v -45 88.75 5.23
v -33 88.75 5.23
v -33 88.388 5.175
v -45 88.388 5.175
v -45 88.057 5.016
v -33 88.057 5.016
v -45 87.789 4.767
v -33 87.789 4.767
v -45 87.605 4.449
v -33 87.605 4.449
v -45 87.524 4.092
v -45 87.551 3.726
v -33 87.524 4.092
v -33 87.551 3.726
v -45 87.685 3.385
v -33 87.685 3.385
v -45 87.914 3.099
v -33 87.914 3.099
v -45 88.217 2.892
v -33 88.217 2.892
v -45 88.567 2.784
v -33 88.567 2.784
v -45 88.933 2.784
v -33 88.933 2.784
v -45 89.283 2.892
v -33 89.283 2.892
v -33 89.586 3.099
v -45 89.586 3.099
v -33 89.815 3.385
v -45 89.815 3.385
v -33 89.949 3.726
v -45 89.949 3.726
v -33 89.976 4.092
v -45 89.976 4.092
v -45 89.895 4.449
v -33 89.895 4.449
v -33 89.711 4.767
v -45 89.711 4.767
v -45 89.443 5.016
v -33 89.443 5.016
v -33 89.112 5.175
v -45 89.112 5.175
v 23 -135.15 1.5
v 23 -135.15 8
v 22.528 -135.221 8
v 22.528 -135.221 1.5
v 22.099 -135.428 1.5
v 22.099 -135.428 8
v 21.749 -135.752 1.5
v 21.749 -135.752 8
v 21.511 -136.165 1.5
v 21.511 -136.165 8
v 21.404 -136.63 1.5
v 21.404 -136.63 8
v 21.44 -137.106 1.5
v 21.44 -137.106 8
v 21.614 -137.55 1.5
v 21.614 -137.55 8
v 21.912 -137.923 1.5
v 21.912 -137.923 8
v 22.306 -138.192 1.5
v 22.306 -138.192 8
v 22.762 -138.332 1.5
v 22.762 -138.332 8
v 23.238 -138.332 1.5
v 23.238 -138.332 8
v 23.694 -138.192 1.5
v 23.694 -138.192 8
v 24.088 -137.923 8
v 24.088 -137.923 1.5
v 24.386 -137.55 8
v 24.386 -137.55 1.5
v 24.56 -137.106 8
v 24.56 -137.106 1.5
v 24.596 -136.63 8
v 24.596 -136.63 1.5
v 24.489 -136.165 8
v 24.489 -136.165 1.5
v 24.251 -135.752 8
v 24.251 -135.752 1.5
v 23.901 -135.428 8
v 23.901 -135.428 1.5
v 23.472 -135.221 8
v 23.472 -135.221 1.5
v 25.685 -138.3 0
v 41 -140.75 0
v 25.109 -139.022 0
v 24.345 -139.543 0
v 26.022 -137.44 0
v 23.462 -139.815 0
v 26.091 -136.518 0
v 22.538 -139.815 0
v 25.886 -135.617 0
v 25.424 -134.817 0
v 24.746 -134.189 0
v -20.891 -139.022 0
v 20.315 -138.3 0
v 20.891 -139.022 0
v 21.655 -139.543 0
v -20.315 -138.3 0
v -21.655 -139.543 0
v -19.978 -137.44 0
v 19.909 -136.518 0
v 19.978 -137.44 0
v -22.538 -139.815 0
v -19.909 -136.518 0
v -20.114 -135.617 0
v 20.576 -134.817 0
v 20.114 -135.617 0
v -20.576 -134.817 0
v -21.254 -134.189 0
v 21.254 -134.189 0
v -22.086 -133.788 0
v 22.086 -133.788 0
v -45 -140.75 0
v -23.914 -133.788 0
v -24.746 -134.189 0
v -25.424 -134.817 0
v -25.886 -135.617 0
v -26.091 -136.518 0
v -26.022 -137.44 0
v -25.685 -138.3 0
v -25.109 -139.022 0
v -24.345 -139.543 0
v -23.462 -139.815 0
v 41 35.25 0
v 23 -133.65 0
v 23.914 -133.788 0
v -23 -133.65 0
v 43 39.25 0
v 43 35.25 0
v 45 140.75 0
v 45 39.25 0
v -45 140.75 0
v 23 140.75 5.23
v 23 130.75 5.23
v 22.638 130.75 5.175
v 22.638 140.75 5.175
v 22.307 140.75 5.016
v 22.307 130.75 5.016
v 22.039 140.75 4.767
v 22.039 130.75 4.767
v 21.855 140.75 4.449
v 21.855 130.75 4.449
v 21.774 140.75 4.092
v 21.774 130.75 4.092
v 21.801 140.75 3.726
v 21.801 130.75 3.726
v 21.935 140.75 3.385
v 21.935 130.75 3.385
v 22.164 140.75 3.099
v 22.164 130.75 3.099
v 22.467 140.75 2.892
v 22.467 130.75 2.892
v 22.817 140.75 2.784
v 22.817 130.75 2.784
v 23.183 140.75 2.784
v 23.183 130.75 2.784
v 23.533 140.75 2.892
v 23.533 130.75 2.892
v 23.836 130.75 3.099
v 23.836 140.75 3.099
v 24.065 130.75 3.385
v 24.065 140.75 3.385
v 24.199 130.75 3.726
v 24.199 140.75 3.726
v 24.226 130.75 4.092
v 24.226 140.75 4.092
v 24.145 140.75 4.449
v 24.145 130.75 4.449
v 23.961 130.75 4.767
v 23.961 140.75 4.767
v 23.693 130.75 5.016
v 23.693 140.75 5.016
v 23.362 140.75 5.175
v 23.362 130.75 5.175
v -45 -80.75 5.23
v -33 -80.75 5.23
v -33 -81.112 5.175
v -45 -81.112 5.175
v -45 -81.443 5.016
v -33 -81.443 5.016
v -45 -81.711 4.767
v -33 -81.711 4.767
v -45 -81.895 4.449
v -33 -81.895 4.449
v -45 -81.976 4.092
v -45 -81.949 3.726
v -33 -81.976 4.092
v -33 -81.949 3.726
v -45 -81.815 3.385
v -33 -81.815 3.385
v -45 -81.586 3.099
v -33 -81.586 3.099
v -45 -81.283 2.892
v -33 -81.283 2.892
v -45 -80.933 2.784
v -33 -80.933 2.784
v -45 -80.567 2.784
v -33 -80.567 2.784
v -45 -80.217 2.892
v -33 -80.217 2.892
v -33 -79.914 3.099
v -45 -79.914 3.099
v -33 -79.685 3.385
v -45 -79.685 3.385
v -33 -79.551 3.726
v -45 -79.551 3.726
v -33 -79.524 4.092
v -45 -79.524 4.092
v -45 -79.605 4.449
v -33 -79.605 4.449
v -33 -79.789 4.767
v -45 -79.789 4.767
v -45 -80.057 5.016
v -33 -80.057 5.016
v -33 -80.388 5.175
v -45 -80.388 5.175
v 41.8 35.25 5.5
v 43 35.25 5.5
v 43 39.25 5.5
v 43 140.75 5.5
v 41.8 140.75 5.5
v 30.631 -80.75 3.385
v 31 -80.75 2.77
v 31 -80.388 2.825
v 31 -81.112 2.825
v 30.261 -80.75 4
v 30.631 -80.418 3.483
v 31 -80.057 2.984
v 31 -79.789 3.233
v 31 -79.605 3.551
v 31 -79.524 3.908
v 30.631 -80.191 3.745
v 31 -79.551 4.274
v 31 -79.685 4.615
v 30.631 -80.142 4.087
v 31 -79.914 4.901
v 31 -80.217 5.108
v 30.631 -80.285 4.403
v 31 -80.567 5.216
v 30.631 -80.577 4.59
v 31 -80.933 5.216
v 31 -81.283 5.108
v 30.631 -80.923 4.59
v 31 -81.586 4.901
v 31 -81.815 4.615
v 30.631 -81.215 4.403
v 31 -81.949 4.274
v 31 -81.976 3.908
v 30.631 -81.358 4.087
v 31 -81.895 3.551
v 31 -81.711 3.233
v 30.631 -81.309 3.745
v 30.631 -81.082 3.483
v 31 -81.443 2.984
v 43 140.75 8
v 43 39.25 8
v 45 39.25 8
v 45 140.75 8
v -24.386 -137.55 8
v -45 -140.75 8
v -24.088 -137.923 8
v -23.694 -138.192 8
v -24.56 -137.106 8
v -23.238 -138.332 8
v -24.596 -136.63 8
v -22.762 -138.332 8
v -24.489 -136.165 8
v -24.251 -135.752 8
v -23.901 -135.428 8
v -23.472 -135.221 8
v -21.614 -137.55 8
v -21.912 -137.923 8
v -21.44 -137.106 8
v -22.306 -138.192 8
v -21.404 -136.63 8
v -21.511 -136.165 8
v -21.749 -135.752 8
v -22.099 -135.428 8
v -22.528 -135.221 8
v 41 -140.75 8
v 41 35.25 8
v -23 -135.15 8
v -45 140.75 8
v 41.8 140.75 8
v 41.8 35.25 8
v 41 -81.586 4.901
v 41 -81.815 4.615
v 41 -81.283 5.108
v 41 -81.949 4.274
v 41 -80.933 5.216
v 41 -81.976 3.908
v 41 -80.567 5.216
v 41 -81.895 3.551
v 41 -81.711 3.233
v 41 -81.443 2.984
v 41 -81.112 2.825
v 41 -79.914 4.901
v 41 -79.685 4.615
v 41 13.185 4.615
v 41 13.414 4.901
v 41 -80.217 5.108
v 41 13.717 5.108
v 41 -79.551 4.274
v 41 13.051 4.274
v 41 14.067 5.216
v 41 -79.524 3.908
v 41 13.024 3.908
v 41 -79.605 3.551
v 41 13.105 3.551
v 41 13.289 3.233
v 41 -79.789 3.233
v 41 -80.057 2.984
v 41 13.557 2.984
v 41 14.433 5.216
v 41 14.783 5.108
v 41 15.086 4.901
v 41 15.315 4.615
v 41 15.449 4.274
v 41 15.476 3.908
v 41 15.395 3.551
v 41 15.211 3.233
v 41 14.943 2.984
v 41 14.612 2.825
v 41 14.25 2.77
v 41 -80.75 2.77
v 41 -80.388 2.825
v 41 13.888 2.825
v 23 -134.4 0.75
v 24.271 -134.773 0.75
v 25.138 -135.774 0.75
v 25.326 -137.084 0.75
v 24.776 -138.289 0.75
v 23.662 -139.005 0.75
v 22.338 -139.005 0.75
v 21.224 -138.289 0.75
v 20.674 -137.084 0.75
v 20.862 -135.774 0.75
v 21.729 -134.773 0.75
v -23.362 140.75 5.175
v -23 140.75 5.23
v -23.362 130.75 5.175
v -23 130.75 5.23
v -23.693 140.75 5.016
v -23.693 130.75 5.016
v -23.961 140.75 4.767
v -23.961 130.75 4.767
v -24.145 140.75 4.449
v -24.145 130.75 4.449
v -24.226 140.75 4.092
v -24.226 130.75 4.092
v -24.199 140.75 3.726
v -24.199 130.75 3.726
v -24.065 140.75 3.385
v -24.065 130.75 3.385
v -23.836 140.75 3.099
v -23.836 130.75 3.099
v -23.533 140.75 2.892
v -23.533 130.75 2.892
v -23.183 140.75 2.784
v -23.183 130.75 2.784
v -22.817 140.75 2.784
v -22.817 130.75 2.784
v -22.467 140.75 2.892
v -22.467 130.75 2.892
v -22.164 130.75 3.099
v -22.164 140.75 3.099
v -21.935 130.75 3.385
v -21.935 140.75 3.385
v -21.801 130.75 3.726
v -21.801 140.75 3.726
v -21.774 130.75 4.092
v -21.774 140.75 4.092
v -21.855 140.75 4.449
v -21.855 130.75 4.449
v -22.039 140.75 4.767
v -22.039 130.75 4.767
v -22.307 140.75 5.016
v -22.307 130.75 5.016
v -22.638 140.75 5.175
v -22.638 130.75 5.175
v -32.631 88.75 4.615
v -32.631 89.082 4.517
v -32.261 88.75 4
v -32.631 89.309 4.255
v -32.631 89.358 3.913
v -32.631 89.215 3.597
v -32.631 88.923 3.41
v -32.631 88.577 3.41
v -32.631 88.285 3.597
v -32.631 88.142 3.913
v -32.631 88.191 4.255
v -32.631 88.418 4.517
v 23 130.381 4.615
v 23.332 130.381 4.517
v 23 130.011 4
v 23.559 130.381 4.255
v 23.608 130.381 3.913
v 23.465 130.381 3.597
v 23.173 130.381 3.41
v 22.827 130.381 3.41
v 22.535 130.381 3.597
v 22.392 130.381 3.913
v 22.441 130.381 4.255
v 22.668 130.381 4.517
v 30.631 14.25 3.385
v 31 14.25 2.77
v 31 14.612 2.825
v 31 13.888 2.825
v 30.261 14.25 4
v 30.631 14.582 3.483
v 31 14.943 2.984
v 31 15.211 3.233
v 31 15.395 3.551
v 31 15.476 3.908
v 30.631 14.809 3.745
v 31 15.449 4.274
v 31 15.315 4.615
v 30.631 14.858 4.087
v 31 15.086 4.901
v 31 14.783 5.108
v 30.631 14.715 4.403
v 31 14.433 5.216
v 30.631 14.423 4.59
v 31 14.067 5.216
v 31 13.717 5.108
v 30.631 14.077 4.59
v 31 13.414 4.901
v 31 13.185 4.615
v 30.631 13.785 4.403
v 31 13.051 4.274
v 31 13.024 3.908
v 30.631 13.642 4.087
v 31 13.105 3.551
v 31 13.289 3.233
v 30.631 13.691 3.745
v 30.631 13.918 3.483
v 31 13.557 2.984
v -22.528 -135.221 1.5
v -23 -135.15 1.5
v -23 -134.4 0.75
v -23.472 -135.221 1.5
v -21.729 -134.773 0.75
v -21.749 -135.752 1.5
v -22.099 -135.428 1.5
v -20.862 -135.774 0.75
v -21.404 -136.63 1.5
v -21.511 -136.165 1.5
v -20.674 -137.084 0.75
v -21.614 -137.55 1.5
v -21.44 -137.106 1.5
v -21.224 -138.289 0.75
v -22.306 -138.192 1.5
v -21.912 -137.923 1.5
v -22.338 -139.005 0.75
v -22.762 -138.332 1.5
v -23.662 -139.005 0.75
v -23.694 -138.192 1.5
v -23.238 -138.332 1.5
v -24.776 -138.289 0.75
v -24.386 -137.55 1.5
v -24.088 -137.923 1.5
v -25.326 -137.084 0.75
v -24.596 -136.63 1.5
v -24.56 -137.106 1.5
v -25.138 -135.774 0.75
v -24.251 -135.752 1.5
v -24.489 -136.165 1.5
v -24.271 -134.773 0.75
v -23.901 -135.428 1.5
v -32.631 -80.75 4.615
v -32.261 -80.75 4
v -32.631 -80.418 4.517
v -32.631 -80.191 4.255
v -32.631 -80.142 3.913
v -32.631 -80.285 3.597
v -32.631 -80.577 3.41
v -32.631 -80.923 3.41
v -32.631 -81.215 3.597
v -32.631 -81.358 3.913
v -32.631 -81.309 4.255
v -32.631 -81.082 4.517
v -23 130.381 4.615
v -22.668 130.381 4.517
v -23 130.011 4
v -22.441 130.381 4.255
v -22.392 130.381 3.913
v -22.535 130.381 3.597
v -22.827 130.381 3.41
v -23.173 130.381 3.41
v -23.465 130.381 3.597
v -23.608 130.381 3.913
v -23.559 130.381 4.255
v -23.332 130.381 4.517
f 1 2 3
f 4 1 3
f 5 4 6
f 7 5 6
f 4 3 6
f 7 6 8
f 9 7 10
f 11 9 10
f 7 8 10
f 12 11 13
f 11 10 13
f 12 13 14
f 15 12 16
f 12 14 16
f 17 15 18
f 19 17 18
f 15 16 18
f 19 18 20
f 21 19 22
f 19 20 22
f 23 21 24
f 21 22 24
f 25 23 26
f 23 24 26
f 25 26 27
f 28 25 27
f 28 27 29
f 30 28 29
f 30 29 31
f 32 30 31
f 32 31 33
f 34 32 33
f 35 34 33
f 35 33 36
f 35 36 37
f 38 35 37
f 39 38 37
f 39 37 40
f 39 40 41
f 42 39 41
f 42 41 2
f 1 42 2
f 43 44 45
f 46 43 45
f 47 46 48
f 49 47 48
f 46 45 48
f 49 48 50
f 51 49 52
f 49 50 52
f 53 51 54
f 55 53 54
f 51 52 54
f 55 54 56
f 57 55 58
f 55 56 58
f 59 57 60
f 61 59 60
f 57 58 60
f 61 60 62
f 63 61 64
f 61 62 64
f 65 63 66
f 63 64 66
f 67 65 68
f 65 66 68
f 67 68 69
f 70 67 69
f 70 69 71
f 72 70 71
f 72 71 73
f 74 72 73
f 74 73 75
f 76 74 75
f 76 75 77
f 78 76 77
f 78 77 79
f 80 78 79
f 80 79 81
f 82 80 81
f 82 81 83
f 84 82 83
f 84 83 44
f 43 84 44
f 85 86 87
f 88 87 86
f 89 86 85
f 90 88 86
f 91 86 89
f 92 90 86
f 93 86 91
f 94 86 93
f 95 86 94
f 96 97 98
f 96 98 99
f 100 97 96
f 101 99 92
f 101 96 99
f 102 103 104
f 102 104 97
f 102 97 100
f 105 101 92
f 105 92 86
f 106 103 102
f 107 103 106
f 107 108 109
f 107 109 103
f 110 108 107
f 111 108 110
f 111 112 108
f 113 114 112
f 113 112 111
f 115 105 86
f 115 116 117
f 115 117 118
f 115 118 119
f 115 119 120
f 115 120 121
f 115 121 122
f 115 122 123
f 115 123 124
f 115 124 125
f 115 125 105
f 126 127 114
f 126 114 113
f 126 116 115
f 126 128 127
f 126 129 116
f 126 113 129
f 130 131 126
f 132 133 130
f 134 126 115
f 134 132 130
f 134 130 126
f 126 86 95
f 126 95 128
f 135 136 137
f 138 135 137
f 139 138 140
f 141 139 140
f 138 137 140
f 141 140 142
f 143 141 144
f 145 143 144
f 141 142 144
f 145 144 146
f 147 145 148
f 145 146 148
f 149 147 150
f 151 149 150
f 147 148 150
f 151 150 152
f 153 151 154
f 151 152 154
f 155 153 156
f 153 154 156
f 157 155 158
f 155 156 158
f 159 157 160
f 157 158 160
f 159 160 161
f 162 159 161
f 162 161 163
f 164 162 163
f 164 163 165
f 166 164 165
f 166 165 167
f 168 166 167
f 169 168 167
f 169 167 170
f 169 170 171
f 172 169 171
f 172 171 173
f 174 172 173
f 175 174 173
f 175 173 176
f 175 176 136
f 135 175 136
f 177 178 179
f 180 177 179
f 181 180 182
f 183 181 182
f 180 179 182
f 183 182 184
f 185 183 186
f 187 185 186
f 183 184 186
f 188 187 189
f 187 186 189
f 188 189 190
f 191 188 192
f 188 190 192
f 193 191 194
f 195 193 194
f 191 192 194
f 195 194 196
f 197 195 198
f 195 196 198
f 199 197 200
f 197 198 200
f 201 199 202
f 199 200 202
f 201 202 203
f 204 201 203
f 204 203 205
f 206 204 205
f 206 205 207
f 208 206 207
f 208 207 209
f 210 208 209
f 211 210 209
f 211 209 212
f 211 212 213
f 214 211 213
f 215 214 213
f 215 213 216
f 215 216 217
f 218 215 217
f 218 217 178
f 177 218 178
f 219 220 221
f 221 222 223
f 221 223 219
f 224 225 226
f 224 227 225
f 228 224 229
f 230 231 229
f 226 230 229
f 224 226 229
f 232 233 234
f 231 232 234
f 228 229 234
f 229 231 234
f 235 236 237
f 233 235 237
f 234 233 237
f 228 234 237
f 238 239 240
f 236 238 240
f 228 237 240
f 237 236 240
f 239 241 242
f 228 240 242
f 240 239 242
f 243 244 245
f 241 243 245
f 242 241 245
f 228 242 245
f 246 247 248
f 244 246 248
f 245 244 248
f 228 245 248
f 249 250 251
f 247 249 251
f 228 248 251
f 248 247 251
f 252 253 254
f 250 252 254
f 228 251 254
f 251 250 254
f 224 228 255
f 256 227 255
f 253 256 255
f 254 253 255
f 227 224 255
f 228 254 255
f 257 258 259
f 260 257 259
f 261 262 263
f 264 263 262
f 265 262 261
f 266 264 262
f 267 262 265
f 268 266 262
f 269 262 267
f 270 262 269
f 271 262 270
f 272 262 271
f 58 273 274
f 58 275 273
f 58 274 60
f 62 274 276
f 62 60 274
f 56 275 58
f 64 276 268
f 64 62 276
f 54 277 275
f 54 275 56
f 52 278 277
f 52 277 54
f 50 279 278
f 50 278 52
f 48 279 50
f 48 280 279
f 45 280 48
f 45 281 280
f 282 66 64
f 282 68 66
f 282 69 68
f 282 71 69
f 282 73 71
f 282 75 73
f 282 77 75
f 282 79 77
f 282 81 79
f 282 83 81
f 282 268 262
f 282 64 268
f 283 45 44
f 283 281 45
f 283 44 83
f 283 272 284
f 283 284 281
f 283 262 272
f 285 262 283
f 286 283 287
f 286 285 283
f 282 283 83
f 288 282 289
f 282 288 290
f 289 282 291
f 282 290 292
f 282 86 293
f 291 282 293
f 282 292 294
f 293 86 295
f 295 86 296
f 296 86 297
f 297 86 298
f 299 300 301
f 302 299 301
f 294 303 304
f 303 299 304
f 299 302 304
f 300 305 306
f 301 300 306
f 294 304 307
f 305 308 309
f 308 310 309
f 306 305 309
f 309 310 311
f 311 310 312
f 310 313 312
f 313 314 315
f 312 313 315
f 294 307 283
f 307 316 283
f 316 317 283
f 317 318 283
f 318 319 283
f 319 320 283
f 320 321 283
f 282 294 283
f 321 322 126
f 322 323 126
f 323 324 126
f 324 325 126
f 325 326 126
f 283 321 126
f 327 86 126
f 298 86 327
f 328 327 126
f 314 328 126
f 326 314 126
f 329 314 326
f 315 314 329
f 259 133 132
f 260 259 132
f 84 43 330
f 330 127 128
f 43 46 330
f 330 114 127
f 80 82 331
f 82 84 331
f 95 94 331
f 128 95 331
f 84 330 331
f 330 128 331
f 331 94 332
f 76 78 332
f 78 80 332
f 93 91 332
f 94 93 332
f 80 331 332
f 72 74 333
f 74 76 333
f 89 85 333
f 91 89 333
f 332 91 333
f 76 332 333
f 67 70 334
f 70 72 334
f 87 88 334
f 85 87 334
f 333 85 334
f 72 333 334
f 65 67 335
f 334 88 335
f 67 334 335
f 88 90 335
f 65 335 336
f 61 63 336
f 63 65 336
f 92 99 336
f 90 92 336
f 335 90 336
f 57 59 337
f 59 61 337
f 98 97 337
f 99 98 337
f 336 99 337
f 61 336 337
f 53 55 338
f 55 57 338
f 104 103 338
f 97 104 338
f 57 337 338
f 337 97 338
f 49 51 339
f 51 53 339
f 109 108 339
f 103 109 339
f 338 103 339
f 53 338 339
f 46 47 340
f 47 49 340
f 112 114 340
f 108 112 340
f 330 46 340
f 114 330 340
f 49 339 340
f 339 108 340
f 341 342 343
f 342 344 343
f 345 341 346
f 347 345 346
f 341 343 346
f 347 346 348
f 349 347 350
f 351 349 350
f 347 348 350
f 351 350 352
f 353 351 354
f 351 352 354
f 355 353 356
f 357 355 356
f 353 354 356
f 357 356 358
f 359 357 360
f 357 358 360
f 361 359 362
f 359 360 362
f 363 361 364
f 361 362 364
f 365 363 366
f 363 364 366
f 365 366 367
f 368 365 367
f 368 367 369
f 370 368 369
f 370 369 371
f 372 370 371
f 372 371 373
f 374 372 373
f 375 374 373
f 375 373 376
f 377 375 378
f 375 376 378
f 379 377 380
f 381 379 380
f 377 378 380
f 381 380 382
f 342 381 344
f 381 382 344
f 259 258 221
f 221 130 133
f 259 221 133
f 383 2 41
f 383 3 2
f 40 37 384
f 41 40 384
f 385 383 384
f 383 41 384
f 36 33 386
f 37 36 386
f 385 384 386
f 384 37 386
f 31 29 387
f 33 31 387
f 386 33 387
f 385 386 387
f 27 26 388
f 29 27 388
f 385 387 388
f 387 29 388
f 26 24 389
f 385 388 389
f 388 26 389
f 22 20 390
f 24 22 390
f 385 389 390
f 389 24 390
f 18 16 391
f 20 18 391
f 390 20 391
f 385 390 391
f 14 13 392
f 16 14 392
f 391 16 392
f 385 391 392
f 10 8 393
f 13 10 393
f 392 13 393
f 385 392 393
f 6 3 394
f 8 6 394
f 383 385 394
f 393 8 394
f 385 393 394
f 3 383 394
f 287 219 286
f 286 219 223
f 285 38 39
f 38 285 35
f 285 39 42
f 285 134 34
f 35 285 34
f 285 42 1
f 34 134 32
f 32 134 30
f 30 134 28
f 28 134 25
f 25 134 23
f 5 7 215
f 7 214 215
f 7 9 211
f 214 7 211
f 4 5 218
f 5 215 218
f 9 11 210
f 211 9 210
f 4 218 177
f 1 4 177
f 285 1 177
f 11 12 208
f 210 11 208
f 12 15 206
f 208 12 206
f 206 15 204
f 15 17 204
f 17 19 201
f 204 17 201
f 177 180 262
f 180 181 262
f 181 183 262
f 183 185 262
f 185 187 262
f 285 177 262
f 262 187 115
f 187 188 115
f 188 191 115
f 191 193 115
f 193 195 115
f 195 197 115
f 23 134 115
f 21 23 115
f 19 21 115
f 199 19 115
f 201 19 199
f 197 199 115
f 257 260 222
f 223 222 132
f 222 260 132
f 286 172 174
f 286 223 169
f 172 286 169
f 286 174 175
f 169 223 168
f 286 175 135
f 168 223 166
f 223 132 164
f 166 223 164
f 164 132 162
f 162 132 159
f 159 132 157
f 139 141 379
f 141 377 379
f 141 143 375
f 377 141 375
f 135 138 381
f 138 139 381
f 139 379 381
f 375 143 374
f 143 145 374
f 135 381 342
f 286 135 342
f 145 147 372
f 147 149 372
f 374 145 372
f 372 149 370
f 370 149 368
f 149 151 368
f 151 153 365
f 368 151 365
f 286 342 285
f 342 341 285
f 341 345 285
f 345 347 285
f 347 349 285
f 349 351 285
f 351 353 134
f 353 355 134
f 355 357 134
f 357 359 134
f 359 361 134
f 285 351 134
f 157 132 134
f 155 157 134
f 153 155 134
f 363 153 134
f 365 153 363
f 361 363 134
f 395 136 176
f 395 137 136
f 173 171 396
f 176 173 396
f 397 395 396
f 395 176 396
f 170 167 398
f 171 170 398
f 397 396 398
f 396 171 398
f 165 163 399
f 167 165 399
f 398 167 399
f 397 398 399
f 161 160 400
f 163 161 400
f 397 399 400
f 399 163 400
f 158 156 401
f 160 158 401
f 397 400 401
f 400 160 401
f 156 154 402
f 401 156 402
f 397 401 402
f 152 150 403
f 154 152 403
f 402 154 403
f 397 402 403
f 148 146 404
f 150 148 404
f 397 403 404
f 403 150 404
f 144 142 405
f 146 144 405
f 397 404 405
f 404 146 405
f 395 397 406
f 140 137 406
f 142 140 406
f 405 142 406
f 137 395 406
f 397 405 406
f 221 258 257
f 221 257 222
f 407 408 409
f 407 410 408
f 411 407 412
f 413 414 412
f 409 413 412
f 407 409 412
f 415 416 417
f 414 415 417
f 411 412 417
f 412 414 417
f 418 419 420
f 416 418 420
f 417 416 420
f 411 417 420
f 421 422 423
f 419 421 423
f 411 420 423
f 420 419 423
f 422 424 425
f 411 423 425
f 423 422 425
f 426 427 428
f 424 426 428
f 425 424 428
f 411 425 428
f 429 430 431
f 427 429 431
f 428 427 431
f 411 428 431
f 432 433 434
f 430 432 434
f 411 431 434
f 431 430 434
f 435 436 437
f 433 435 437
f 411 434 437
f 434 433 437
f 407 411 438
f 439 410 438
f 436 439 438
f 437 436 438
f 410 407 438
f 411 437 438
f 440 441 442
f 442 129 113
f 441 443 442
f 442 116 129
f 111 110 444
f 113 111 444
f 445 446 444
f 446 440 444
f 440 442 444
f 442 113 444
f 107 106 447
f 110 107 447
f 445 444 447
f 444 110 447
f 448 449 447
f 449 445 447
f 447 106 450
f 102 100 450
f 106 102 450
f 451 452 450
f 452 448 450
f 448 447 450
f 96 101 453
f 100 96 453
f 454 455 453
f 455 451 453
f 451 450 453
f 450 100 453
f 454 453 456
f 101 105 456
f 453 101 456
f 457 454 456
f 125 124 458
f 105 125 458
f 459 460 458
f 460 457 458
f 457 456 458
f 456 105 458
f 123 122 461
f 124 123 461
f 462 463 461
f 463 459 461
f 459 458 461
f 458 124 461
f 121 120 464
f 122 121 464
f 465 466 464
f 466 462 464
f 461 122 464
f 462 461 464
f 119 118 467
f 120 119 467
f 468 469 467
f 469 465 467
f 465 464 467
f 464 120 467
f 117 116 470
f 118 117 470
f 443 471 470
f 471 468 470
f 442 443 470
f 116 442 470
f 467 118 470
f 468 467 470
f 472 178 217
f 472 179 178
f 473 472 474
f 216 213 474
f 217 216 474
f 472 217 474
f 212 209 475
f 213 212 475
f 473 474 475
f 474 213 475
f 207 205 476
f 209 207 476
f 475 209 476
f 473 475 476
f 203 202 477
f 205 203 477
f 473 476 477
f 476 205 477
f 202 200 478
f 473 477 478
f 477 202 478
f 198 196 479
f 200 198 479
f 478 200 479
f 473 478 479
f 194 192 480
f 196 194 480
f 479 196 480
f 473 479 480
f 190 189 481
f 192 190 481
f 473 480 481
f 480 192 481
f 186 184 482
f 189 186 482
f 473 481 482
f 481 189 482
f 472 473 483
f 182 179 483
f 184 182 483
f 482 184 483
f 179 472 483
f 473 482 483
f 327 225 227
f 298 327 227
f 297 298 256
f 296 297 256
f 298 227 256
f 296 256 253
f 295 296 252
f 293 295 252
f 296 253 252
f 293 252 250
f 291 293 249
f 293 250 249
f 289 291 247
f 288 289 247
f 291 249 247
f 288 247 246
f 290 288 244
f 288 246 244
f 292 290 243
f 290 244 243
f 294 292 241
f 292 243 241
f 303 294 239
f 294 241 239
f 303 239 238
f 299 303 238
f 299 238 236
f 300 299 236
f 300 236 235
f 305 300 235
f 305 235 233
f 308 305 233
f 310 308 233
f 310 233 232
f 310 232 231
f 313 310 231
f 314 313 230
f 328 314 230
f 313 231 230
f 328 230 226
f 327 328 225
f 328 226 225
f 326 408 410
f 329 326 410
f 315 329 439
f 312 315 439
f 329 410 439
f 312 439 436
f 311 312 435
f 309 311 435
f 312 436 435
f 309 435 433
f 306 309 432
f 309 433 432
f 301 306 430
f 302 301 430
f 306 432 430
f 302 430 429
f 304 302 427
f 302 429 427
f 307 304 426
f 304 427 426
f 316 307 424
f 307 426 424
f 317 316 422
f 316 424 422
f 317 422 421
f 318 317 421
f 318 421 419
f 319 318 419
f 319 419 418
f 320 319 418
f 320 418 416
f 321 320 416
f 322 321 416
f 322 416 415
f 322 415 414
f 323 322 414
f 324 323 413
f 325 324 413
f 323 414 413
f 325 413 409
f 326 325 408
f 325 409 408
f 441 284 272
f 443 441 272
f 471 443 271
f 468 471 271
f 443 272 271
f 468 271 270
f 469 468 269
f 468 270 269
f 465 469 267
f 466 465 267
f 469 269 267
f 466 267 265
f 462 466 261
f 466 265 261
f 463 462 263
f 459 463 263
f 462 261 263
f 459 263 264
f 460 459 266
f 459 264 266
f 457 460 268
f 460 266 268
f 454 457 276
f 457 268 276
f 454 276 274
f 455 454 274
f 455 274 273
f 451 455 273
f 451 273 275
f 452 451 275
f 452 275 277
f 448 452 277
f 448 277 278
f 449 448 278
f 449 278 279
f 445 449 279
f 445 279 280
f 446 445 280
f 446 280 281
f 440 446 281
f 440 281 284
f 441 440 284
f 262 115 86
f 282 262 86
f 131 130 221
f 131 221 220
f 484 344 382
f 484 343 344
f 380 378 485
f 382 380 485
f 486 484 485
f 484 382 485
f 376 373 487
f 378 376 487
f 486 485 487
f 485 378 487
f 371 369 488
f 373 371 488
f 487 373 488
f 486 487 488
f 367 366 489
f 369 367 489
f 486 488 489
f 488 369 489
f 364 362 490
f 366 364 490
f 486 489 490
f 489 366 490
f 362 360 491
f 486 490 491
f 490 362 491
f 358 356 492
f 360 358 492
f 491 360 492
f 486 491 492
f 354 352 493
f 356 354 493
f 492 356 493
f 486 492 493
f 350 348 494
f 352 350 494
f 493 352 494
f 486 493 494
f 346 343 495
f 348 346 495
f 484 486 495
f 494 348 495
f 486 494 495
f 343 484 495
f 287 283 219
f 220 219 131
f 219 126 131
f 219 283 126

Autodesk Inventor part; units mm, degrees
ref_plane "YZ Plane" through (0, 0, 0) normal (1, 0, 0) x (0, 1, 0)
ref_plane "XZ Plane" through (0, 0, 0) normal (0, 1, 0) x (-1, 0, 0)
ref_plane "XY Plane" through (0, 0, 0) normal (0, 0, 1) x (1, 0, 0)
sketch "Skizze1" plane through (0, 0, 0) normal (0, 0, 1) x (1, 0, 0)
  line L0 (45, 140.75) -> (-45, 140.75)
  line L1 (-45, 140.75) -> (-45, -140.75)
  line L2 (-45, -140.75) -> (45, -140.75)
  line L3 (45, -140.75) -> (45, 140.75)
  line L4 (0, 197.05) -> (0, -197.05) projected
  line L5 (-63, 0) -> (63, 0) projected
  point P0 (0, 0)
  point P1 (45, 0)
  point P2 (0, -140.75)
  dimension "d0" = 281.5
  dimension "d1" = 90
extrude "Extrusion1" add sketch "Skizze1" along normal blind 8
sketch "Skizze2" plane through (-45, -140.75, 0) normal (0, -1, 0) x (1, 0, 0)
  line L0 (90, 8) -> (0, 8) projected
  line L1 (86.8, 8) -> (88, 8)
  line L2 (88, 8) -> (88, 5.5)
  line L3 (88, 5.5) -> (86.8, 5.5)
  line L4 (86.8, 5.5) -> (86.8, 8)
  line L5 (90, 0) -> (90, 8) projected
  point P0 (45, 0)
  dimension "d4" = 1.2
  dimension "d5" = 2.5
  dimension "d8" = 2
extrude "Extrusion2" cut sketch "Skizze2" against normal through all
sketch "Skizze3" plane through (0, 0, 0) normal (0, 0, -1) x (-1, 0, 0)
  line L0 (-45, -140.75) -> (-41, -140.75)
  line L1 (-41, -140.75) -> (-41, 39.25)
  line L2 (-41, 39.25) -> (-45, 39.25)
  line L3 (-45, 39.25) -> (-45, -140.75)
  point P0 (0, 0)
  dimension "d9" = 4
  dimension "d10" = 180
extrude "Extrusion3" cut sketch "Skizze3" against normal through all
sketch "Skizze4" plane through (0, 0, 0) normal (0, 0, -1) x (-1, 0, 0)
  line L0 (-41, 39.25) -> (-43, 39.25)
  line L1 (-43, 39.25) -> (-43, 35.25)
  line L2 (-43, 35.25) -> (-41, 35.25)
  line L3 (-41, 35.25) -> (-41, 39.25)
  point P0 (0, 0)
  dimension "d13" = 4
  dimension "d14" = 2
extrude "Extrusion4" add sketch "Skizze4" against normal blind 5.5
sketch "Skizze5" plane through (41.8, 39.25, 5.5) normal (0, 0, 1) x (1, 0, 0)
  line L0 (0, 0) -> (-0.8, 0)
  line L1 (-0.8, 0) -> (-0.8, -4)
  line L2 (-0.8, -4) -> (0, -4)
  line L3 (0, -4) -> (0, 0)
  point P0 (-41.8, -39.25)
extrude "Extrusion5" add sketch "Skizze5" along normal up to surface (2.5 mm away)
sketch "Skizze6" plane through (-45, -140.75, 0) normal (-1, 0, 0) x (0, 0, 1)
  line L0 (0, 0) -> (8, 0) projected
  line L1 (0, 281.5) -> (8, 281.5) projected
  line L2 (0, 281.5) -> (0, 0) projected
  point P0 (0, 140.75)
  point P1 (4, 60)
  point P2 (4, 229.5)
  dimension "d19" = 60
  dimension "d41" = 52
  dimension "d42" = 4
hole "Bohrung1" at (-45, -80.75, 4) at (-45, 88.75, 4) direction (1, 0, 0) diameter 2.459 depth 12 tip angle 118 thread size "M3x0.5" class "6H" standard "ISO Metric profile"
sketch "Skizze7" plane through (-45, 140.75, 0) normal (0, 1, 0) x (1, 0, 0)
  arc A0 (90, -95.2303) -> (67.5, -77) centre (67.5, -100) ccw projected
  line L0 (90, 0) -> (90, -95.2303) projected
  line L1 (0, 0) -> (90, 0) projected
  line L2 (0, -77) -> (0, 0) projected
  line L3 (0, -77) -> (67.5, -77) projected
  point P0 (22, -4)
  point P1 (68, -4)
hole "Bohrung2" at (-23, 140.75, 4) at (23, 140.75, 4) direction (0, -1, 0) diameter 2.459 depth 10 tip angle 118 thread size "M3x0.5" class "6H" standard "ISO Metric profile"
sketch "Skizze8" plane through (0, 0, 0) normal (0, 0, -1) x (-1, 0, 0)
  line L0 (-41.8, 35.25) -> (-41.8, 140.75) projected
  line L1 (45, 140.75) -> (-41.8, 140.75) projected
  line L2 (45, -140.75) -> (45, 140.75) projected
  line L3 (-41, -140.75) -> (45, -140.75) projected
  line L4 (-41, -140.75) -> (-41, 35.25) projected
  line L5 (-41.8, 35.25) -> (-41, 35.25) projected
  circle A0 centre (-23, -136.75) radius 3.1 projected
  circle A1 centre (23, -136.75) radius 3.1 projected
  line L6 (45, -140.75) -> (45, 140.75) projected
  line L7 (-41, -140.75) -> (45, -140.75) projected
  line L8 (-41, 140.75) -> (-41, -140.75) projected
  line L9 (45, 140.75) -> (-41, 140.75) projected
  point P0 (0, 0)
hole "Bohrung3" at (23, -136.75, 0) at (-23, -136.75, 0) direction (0, 0, 1) diameter 3.2 end through all countersink diameter 6.2 countersink angle 90
sketch "Skizze10" plane through (41, -140.75, 8) normal (1, 0, 0) x (0, 0, -1)
  circle A0 centre (4, 155) radius 3.1 projected
  circle A1 centre (4, 60) radius 3.1 projected
  point P0 (8, 140.75)
hole "Bohrung4" at (41, -80.75, 4) at (41, 14.25, 4) direction (-1, 0, 0) diameter 2.459 depth 10 tip angle 118 thread size "M3x0.5" class "6H" standard "ISO Metric profile"
properties part number "Wand2" material "Polycarbonate, Smoke"
